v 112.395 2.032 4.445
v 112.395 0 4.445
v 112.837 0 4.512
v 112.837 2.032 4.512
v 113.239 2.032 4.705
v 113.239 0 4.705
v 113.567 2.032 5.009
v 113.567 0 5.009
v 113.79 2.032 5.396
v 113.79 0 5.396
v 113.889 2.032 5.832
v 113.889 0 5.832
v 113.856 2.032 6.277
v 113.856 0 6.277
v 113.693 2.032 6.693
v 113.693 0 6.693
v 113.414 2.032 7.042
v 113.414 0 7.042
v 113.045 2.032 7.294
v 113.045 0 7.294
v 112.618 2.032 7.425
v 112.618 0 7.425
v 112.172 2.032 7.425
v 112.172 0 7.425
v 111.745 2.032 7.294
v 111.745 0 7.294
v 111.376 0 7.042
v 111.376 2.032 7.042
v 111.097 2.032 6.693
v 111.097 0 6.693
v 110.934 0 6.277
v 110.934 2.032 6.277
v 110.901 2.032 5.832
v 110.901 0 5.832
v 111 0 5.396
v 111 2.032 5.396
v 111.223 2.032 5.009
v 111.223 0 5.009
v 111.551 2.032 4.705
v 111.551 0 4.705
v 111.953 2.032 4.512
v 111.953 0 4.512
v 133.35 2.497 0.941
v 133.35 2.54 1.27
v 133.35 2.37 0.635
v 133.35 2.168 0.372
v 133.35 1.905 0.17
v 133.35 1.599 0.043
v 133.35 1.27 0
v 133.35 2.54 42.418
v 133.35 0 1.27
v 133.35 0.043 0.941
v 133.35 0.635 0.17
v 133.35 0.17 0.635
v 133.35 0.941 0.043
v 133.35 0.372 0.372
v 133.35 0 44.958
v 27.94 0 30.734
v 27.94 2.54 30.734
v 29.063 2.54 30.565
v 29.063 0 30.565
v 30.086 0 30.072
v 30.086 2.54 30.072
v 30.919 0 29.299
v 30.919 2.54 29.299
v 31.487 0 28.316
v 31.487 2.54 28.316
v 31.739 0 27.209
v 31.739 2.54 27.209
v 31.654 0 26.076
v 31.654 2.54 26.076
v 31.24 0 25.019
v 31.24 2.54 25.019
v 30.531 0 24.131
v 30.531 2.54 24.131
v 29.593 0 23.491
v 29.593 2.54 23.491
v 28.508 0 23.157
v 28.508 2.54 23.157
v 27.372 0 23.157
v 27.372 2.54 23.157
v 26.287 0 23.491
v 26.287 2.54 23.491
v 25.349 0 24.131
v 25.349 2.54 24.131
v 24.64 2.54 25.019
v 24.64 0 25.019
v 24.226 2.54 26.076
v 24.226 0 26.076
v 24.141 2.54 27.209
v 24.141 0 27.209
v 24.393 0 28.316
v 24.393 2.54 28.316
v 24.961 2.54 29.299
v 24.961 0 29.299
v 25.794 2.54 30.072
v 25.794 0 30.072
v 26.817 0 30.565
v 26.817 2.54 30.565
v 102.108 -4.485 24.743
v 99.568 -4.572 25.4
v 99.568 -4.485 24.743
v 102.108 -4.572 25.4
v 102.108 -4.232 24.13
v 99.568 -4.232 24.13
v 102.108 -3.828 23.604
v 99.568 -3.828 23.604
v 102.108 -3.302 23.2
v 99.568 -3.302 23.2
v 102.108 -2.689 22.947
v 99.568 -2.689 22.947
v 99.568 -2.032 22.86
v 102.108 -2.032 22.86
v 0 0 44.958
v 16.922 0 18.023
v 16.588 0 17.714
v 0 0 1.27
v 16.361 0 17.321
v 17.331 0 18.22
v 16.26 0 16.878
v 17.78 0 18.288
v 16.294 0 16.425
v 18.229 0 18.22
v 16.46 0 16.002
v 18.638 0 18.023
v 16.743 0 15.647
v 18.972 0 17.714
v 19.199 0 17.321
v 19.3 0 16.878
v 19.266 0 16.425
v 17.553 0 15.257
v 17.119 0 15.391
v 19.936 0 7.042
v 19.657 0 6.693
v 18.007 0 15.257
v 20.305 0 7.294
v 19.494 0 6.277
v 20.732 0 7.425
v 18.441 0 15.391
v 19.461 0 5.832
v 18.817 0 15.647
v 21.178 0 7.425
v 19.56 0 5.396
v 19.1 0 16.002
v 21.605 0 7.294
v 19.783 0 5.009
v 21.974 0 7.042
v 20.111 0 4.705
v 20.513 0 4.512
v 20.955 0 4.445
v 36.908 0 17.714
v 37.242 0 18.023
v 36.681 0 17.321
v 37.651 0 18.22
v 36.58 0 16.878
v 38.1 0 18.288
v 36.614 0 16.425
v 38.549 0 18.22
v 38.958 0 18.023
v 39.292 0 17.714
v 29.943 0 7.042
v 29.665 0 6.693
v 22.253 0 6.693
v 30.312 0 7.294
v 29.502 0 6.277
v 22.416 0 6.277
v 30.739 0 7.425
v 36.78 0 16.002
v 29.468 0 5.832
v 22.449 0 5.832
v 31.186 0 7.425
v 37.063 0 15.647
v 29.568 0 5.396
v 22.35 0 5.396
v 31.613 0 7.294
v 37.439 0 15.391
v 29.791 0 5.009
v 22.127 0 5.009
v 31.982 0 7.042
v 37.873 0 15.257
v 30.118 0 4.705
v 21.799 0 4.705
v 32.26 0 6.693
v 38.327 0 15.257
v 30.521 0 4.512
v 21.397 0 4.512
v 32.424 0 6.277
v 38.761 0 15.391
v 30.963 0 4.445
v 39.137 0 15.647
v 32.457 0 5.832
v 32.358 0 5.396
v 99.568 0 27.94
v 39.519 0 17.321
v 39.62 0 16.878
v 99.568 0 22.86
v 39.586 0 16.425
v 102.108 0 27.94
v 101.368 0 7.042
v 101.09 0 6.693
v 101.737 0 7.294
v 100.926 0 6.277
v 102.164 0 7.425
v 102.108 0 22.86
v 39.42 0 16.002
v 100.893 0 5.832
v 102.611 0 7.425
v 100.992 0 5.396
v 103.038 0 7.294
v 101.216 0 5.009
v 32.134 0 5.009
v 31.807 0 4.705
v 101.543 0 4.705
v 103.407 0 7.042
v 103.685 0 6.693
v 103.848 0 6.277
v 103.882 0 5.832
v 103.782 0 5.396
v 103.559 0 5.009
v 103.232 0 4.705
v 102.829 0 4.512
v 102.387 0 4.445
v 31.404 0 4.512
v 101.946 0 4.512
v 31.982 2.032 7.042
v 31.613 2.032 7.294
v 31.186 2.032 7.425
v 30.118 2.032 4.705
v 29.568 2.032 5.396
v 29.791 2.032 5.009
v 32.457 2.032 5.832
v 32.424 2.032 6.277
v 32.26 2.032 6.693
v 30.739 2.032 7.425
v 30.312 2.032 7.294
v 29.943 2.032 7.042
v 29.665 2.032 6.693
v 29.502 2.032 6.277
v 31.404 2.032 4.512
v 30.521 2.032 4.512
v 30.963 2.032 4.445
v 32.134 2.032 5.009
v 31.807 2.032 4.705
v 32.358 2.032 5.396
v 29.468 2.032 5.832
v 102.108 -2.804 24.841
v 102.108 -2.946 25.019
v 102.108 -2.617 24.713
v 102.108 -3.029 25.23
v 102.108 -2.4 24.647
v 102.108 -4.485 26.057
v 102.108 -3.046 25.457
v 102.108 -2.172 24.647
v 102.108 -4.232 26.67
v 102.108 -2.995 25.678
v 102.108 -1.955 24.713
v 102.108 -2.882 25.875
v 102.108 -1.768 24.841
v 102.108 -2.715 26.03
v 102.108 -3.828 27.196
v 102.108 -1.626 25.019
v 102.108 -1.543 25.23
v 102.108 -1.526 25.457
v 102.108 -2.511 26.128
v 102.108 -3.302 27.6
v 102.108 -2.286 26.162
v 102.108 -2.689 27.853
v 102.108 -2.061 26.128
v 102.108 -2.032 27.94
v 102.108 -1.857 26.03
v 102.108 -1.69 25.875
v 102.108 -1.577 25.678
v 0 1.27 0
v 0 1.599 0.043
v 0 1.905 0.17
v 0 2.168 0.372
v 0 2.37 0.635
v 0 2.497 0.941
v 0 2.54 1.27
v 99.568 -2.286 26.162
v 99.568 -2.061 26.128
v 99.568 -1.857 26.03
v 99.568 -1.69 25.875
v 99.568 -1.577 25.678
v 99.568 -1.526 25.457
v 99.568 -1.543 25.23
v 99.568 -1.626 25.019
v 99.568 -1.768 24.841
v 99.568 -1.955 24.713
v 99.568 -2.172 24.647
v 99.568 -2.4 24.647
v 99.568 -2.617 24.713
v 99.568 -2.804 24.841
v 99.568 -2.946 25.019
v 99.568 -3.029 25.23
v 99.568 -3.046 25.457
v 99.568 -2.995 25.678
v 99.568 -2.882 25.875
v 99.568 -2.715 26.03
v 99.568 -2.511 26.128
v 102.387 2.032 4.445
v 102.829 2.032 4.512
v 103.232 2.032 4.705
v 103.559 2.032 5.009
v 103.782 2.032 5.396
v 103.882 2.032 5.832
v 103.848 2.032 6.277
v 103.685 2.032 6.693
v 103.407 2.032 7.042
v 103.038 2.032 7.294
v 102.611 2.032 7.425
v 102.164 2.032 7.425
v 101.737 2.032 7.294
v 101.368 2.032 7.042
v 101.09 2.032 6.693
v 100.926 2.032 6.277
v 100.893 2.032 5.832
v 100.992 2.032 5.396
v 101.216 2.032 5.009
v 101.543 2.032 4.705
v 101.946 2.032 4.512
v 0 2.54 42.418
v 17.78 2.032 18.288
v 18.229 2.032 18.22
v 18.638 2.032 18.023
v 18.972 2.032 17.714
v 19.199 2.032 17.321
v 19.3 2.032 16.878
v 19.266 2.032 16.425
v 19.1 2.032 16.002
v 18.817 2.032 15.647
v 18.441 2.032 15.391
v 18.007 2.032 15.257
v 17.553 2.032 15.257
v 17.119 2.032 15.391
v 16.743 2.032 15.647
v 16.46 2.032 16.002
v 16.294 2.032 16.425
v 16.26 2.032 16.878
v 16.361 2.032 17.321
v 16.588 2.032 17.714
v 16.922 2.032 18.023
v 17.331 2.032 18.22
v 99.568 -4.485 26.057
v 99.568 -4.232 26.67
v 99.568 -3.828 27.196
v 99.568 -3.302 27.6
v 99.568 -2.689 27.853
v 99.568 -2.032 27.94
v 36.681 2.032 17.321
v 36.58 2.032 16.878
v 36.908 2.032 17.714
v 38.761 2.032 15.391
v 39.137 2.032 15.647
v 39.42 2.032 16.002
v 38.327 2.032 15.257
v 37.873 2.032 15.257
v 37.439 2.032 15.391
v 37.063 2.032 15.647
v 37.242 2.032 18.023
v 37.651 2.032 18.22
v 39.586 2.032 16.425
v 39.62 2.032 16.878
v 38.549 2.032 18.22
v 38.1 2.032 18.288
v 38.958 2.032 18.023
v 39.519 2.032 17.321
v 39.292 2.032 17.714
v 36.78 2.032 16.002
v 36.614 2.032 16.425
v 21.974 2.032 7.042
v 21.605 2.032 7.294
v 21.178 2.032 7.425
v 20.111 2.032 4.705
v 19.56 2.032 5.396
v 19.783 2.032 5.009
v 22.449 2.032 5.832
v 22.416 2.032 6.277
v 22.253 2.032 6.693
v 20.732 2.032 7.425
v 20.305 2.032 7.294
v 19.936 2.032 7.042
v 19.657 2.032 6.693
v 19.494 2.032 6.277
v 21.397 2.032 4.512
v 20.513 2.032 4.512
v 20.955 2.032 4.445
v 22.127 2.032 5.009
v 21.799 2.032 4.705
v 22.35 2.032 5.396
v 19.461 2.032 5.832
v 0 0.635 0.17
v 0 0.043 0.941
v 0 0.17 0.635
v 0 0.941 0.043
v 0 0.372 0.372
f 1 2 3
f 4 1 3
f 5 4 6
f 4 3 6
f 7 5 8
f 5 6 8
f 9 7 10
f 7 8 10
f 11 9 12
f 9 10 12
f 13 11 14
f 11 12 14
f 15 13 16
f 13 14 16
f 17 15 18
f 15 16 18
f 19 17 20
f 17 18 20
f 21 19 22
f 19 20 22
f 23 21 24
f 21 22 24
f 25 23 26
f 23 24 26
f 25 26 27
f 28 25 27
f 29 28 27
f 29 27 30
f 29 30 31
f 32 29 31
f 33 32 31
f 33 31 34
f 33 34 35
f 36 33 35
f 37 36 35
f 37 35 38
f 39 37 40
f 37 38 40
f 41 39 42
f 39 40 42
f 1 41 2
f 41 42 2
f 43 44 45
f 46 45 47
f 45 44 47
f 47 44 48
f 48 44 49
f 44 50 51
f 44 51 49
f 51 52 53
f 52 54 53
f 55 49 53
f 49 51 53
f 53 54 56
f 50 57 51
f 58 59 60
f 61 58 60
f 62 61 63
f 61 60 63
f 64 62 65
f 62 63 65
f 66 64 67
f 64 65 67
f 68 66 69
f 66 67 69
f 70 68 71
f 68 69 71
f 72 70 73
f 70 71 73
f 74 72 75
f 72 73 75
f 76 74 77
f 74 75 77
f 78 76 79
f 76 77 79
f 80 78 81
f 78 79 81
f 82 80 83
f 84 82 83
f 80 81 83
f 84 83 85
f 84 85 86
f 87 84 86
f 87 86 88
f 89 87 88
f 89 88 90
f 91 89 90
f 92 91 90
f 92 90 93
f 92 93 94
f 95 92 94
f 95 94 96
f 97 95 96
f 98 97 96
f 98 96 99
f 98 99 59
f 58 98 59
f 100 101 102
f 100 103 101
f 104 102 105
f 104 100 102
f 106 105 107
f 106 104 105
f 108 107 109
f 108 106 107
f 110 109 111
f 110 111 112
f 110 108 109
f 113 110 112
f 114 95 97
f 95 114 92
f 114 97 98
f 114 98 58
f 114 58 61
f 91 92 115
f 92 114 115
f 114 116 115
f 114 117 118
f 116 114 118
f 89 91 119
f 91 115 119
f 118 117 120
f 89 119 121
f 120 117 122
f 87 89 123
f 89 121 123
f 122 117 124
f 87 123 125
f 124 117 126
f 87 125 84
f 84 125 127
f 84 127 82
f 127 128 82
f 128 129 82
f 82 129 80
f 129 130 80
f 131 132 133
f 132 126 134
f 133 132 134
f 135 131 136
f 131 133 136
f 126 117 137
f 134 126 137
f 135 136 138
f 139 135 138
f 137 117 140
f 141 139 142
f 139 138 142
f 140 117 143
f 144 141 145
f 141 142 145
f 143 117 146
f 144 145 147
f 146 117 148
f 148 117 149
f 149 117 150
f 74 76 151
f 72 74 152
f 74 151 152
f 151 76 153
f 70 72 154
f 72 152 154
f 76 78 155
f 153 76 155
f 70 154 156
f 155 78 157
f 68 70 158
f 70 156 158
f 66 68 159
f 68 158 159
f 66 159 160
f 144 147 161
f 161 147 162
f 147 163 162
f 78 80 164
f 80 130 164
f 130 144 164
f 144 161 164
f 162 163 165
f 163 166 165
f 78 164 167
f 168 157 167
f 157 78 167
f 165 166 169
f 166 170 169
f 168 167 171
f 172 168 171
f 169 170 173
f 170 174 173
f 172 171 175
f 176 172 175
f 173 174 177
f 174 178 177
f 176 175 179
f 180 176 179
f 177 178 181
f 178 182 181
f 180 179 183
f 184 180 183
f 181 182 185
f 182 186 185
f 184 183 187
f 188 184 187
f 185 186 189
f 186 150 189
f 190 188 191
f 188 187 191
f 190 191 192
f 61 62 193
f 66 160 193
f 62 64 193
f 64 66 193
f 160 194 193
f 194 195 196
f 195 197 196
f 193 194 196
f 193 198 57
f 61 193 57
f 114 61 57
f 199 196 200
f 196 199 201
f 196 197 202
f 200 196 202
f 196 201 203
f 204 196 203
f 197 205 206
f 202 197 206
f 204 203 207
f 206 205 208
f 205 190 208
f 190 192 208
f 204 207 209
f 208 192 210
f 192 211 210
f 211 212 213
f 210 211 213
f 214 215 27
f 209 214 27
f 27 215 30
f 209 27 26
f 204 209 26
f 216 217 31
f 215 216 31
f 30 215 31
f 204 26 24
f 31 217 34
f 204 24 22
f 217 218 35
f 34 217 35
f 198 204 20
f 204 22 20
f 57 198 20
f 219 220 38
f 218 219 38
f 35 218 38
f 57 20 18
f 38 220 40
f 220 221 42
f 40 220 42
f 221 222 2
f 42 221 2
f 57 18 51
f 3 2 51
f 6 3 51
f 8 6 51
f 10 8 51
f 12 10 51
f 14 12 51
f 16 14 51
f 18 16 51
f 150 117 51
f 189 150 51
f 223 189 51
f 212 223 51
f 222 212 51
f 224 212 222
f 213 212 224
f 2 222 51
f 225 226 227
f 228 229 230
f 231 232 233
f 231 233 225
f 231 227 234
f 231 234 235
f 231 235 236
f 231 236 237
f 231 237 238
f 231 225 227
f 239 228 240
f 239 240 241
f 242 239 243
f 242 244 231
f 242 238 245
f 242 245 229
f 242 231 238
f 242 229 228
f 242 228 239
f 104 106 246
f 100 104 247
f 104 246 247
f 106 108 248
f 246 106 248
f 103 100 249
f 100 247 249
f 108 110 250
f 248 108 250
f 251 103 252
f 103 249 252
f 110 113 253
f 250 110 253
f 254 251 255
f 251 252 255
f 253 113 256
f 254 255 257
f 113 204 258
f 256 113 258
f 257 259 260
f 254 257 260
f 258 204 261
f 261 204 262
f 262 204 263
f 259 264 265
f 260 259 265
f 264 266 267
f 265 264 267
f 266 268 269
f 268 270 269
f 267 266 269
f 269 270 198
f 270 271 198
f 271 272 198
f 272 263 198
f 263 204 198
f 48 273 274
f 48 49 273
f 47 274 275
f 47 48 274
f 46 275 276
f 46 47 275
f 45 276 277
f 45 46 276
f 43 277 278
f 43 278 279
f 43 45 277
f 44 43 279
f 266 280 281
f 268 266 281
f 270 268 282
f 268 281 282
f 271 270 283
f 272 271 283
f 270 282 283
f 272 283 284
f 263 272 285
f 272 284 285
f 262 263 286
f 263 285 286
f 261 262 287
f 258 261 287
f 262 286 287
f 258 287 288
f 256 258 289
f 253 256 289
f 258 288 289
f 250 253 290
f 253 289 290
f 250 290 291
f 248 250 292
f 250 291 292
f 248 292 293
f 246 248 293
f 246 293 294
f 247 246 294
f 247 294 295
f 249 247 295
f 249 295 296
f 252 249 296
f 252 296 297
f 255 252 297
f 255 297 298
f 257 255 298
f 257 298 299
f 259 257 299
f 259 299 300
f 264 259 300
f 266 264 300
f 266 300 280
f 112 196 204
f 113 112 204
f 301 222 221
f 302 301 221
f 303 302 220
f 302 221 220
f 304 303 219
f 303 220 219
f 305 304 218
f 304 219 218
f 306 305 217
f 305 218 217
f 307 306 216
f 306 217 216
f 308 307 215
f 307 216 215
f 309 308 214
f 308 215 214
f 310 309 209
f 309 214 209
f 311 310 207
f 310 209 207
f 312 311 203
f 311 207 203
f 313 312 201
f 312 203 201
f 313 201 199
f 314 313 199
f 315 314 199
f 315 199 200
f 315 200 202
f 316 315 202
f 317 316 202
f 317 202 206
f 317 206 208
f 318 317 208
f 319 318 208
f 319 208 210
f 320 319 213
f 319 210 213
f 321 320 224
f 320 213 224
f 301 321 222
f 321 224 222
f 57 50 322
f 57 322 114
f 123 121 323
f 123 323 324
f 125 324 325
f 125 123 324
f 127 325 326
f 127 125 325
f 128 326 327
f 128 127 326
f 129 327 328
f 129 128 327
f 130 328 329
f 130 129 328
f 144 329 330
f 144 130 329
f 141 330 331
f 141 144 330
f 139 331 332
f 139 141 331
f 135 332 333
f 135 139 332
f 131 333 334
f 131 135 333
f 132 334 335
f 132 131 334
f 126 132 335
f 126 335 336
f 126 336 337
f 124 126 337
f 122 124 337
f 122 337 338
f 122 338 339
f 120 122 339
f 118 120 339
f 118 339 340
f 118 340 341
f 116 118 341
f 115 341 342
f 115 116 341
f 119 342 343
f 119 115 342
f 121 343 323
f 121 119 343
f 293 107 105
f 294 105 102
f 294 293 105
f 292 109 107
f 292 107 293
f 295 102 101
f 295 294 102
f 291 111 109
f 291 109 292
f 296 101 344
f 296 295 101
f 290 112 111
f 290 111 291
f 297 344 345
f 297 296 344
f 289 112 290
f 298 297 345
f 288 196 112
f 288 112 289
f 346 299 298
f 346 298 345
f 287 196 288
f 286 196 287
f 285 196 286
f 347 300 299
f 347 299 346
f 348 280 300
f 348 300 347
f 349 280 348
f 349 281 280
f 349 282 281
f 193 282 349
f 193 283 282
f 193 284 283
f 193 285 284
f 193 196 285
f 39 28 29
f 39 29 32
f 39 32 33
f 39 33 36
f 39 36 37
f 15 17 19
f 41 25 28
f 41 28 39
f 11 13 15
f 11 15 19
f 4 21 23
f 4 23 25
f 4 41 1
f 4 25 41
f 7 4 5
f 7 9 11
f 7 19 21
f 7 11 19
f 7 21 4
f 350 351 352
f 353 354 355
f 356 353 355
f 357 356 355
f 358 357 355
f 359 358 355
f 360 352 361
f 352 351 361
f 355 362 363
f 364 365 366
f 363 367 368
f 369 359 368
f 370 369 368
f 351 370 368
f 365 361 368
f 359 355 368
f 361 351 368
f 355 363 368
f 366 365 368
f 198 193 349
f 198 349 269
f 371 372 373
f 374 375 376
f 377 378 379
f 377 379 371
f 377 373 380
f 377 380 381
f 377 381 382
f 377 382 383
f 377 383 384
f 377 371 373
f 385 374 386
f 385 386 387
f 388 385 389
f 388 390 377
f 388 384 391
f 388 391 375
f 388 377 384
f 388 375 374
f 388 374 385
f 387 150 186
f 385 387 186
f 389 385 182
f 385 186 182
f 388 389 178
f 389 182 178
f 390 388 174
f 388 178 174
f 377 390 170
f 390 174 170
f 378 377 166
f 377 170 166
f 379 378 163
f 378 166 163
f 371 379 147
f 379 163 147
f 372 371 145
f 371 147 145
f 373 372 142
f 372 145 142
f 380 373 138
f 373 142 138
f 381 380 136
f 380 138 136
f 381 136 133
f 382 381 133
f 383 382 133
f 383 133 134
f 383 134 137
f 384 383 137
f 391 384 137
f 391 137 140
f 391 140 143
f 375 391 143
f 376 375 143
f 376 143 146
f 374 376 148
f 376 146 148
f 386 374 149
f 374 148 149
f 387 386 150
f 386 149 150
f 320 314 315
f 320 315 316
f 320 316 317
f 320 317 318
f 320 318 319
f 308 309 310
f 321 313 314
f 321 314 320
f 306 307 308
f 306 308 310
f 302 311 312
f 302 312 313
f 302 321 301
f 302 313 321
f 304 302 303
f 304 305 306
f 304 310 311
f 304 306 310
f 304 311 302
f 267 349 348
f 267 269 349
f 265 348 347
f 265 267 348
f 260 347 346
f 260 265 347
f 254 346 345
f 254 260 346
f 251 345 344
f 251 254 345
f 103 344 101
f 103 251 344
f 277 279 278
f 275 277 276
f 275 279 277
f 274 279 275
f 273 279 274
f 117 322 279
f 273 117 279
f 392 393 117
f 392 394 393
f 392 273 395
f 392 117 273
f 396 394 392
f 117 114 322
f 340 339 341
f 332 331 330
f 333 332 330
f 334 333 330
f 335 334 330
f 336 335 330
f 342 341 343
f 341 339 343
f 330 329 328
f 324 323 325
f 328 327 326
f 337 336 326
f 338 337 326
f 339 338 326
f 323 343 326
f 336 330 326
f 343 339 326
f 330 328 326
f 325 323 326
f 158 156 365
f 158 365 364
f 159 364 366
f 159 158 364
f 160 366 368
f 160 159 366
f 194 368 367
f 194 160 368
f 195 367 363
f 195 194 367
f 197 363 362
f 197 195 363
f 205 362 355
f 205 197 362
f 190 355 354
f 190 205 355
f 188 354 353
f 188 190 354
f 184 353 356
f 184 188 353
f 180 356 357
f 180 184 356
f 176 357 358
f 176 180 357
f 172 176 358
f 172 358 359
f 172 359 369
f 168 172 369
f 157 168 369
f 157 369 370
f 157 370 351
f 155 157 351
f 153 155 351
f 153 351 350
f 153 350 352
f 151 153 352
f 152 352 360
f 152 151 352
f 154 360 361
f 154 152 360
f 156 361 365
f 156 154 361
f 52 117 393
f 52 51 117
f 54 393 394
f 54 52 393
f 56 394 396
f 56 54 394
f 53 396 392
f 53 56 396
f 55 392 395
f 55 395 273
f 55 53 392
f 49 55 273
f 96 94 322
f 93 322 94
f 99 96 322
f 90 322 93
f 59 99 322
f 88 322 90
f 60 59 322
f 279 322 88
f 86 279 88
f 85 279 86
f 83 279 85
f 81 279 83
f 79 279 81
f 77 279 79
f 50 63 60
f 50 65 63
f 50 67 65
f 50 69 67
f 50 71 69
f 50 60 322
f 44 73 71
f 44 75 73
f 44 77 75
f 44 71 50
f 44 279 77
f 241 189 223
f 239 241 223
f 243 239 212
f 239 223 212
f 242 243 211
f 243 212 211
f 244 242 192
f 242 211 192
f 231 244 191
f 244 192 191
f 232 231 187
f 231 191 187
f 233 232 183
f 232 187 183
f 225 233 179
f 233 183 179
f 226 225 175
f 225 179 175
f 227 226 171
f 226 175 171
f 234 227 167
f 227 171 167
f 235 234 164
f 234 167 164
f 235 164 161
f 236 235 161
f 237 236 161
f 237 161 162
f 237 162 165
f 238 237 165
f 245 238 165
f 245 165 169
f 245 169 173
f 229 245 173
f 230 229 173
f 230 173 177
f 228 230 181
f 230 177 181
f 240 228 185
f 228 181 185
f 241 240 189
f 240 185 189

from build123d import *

# Parameters (mm, degrees)
SKETCH1_W           = 133.35
SKETCH1_H           = 44.958
BOSS_EXTRUDE1_DEPTH = 2.54
CUT_EXTRUDE1_DEPTH  = 141.747631824
SKETCH6_R           = 3.81
CUT_EXTRUDE3_DEPTH  = 141.747631824
SKETCH7_W           = 2.54
SKETCH7_H           = 5.08
BOSS_EXTRUDE2_DEPTH = 4.572
SKETCH9_R           = 0.762
CUT_EXTRUDE4_DEPTH  = 110.343091103
FILLET2_R           = 2.54
FILLET3_R           = 2.54
FILLET4_R           = 1.27
SKETCH16_R          = 1.4986
CUT_EXTRUDE8_DEPTH  = 2.032
SKETCH17_R          = 1.524
CUT_EXTRUDE9_DEPTH  = 2.032


with BuildPart() as part:
    # Sketch1 → Boss-Extrude1 (new body)
    with BuildSketch(Plane(origin=(0, 0, 0), x_dir=(1, 0, 0), z_dir=(0, 1, 0))):
        with Locations((66.675, -22.479)):
            Rectangle(SKETCH1_W, SKETCH1_H)
    extrude(amount=BOSS_EXTRUDE1_DEPTH)

    # Sketch2 → Cut-Extrude1 (cut, through all)
    with BuildSketch(Plane(origin=(133.35, 0, 0), x_dir=(0, 0, -1), z_dir=(1, 0, 0))):
        Polygon((-44.958, 0), (-44.958, 2.54), (-42.418, 2.54), align=None)
    extrude(amount=-CUT_EXTRUDE1_DEPTH, mode=Mode.SUBTRACT)

    # Sketch6 → Cut-Extrude3 (cut, through all)
    with BuildSketch(Plane(origin=(0, 2.54, 0), x_dir=(1, 0, 0), z_dir=(0, 1, 0))):
        with Locations(Location((27.94, -26.924, 0), (0, 0, 270))):
            Circle(SKETCH6_R)
    extrude(amount=-CUT_EXTRUDE3_DEPTH, mode=Mode.SUBTRACT)

    # Sketch7 → Boss-Extrude2 (add)
    with BuildSketch(Plane.XZ):
        with Locations((100.838, 25.4)):
            Rectangle(SKETCH7_W, SKETCH7_H)
    extrude(amount=BOSS_EXTRUDE2_DEPTH)

    # Sketch9 → Cut-Extrude4 (cut, through all)
    with BuildSketch(Plane.ZY.offset(-99.568)):
        with Locations((25.4, -2.286)):
            Circle(SKETCH9_R)
    extrude(amount=-CUT_EXTRUDE4_DEPTH, mode=Mode.SUBTRACT)

    # Fillet2
    fillet2_edges = [part.edges().sort_by_distance(p)[0] for p in [
        (100.838, -4.572, 27.94),
    ]]
    fillet(fillet2_edges, radius=FILLET2_R)

    # Fillet3
    fillet3_edges = [part.edges().sort_by_distance(p)[0] for p in [
        (100.838, -4.572, 22.86),
    ]]
    fillet(fillet3_edges, radius=FILLET3_R - 0.0001)  # a hair under: the kernel refuses the full size

    # Fillet4
    fillet4_edges = [part.edges().sort_by_distance(p)[0] for p in [
        (66.675, 0, 0),
        (66.675, 2.54, 0),
    ]]
    fillet(fillet4_edges, radius=FILLET4_R - 0.0001)  # a hair under: the kernel refuses the full size

    # Sketch16 → Cut-Extrude8 (cut)
    with BuildSketch(Plane.XZ):
        with Locations(Location((20.955, 5.9436, 0), (0, 0, 270))):
            Circle(SKETCH16_R)
        with Locations(Location((30.9626, 5.9436, 0), (0, 0, 270))):
            Circle(SKETCH16_R)
        with Locations(Location((102.3874, 5.9436, 0), (0, 0, 270))):
            Circle(SKETCH16_R)
        with Locations(Location((112.395, 5.9436, 0), (0, 0, 270))):
            Circle(SKETCH16_R)
    extrude(amount=-CUT_EXTRUDE8_DEPTH, mode=Mode.SUBTRACT)

    # Sketch17 → Cut-Extrude9 (cut)
    with BuildSketch(Plane(origin=(0, 0, 0), x_dir=(1, 0, 0), z_dir=(0, 1, 0))):
        with Locations(Location((38.1, -16.764, 0), (0, 0, 270))):
            Circle(SKETCH17_R)
        with Locations(Location((17.78, -16.764, 0), (0, 0, 270))):
            Circle(SKETCH17_R)
    extrude(amount=CUT_EXTRUDE9_DEPTH, mode=Mode.SUBTRACT)


solid = part.part
